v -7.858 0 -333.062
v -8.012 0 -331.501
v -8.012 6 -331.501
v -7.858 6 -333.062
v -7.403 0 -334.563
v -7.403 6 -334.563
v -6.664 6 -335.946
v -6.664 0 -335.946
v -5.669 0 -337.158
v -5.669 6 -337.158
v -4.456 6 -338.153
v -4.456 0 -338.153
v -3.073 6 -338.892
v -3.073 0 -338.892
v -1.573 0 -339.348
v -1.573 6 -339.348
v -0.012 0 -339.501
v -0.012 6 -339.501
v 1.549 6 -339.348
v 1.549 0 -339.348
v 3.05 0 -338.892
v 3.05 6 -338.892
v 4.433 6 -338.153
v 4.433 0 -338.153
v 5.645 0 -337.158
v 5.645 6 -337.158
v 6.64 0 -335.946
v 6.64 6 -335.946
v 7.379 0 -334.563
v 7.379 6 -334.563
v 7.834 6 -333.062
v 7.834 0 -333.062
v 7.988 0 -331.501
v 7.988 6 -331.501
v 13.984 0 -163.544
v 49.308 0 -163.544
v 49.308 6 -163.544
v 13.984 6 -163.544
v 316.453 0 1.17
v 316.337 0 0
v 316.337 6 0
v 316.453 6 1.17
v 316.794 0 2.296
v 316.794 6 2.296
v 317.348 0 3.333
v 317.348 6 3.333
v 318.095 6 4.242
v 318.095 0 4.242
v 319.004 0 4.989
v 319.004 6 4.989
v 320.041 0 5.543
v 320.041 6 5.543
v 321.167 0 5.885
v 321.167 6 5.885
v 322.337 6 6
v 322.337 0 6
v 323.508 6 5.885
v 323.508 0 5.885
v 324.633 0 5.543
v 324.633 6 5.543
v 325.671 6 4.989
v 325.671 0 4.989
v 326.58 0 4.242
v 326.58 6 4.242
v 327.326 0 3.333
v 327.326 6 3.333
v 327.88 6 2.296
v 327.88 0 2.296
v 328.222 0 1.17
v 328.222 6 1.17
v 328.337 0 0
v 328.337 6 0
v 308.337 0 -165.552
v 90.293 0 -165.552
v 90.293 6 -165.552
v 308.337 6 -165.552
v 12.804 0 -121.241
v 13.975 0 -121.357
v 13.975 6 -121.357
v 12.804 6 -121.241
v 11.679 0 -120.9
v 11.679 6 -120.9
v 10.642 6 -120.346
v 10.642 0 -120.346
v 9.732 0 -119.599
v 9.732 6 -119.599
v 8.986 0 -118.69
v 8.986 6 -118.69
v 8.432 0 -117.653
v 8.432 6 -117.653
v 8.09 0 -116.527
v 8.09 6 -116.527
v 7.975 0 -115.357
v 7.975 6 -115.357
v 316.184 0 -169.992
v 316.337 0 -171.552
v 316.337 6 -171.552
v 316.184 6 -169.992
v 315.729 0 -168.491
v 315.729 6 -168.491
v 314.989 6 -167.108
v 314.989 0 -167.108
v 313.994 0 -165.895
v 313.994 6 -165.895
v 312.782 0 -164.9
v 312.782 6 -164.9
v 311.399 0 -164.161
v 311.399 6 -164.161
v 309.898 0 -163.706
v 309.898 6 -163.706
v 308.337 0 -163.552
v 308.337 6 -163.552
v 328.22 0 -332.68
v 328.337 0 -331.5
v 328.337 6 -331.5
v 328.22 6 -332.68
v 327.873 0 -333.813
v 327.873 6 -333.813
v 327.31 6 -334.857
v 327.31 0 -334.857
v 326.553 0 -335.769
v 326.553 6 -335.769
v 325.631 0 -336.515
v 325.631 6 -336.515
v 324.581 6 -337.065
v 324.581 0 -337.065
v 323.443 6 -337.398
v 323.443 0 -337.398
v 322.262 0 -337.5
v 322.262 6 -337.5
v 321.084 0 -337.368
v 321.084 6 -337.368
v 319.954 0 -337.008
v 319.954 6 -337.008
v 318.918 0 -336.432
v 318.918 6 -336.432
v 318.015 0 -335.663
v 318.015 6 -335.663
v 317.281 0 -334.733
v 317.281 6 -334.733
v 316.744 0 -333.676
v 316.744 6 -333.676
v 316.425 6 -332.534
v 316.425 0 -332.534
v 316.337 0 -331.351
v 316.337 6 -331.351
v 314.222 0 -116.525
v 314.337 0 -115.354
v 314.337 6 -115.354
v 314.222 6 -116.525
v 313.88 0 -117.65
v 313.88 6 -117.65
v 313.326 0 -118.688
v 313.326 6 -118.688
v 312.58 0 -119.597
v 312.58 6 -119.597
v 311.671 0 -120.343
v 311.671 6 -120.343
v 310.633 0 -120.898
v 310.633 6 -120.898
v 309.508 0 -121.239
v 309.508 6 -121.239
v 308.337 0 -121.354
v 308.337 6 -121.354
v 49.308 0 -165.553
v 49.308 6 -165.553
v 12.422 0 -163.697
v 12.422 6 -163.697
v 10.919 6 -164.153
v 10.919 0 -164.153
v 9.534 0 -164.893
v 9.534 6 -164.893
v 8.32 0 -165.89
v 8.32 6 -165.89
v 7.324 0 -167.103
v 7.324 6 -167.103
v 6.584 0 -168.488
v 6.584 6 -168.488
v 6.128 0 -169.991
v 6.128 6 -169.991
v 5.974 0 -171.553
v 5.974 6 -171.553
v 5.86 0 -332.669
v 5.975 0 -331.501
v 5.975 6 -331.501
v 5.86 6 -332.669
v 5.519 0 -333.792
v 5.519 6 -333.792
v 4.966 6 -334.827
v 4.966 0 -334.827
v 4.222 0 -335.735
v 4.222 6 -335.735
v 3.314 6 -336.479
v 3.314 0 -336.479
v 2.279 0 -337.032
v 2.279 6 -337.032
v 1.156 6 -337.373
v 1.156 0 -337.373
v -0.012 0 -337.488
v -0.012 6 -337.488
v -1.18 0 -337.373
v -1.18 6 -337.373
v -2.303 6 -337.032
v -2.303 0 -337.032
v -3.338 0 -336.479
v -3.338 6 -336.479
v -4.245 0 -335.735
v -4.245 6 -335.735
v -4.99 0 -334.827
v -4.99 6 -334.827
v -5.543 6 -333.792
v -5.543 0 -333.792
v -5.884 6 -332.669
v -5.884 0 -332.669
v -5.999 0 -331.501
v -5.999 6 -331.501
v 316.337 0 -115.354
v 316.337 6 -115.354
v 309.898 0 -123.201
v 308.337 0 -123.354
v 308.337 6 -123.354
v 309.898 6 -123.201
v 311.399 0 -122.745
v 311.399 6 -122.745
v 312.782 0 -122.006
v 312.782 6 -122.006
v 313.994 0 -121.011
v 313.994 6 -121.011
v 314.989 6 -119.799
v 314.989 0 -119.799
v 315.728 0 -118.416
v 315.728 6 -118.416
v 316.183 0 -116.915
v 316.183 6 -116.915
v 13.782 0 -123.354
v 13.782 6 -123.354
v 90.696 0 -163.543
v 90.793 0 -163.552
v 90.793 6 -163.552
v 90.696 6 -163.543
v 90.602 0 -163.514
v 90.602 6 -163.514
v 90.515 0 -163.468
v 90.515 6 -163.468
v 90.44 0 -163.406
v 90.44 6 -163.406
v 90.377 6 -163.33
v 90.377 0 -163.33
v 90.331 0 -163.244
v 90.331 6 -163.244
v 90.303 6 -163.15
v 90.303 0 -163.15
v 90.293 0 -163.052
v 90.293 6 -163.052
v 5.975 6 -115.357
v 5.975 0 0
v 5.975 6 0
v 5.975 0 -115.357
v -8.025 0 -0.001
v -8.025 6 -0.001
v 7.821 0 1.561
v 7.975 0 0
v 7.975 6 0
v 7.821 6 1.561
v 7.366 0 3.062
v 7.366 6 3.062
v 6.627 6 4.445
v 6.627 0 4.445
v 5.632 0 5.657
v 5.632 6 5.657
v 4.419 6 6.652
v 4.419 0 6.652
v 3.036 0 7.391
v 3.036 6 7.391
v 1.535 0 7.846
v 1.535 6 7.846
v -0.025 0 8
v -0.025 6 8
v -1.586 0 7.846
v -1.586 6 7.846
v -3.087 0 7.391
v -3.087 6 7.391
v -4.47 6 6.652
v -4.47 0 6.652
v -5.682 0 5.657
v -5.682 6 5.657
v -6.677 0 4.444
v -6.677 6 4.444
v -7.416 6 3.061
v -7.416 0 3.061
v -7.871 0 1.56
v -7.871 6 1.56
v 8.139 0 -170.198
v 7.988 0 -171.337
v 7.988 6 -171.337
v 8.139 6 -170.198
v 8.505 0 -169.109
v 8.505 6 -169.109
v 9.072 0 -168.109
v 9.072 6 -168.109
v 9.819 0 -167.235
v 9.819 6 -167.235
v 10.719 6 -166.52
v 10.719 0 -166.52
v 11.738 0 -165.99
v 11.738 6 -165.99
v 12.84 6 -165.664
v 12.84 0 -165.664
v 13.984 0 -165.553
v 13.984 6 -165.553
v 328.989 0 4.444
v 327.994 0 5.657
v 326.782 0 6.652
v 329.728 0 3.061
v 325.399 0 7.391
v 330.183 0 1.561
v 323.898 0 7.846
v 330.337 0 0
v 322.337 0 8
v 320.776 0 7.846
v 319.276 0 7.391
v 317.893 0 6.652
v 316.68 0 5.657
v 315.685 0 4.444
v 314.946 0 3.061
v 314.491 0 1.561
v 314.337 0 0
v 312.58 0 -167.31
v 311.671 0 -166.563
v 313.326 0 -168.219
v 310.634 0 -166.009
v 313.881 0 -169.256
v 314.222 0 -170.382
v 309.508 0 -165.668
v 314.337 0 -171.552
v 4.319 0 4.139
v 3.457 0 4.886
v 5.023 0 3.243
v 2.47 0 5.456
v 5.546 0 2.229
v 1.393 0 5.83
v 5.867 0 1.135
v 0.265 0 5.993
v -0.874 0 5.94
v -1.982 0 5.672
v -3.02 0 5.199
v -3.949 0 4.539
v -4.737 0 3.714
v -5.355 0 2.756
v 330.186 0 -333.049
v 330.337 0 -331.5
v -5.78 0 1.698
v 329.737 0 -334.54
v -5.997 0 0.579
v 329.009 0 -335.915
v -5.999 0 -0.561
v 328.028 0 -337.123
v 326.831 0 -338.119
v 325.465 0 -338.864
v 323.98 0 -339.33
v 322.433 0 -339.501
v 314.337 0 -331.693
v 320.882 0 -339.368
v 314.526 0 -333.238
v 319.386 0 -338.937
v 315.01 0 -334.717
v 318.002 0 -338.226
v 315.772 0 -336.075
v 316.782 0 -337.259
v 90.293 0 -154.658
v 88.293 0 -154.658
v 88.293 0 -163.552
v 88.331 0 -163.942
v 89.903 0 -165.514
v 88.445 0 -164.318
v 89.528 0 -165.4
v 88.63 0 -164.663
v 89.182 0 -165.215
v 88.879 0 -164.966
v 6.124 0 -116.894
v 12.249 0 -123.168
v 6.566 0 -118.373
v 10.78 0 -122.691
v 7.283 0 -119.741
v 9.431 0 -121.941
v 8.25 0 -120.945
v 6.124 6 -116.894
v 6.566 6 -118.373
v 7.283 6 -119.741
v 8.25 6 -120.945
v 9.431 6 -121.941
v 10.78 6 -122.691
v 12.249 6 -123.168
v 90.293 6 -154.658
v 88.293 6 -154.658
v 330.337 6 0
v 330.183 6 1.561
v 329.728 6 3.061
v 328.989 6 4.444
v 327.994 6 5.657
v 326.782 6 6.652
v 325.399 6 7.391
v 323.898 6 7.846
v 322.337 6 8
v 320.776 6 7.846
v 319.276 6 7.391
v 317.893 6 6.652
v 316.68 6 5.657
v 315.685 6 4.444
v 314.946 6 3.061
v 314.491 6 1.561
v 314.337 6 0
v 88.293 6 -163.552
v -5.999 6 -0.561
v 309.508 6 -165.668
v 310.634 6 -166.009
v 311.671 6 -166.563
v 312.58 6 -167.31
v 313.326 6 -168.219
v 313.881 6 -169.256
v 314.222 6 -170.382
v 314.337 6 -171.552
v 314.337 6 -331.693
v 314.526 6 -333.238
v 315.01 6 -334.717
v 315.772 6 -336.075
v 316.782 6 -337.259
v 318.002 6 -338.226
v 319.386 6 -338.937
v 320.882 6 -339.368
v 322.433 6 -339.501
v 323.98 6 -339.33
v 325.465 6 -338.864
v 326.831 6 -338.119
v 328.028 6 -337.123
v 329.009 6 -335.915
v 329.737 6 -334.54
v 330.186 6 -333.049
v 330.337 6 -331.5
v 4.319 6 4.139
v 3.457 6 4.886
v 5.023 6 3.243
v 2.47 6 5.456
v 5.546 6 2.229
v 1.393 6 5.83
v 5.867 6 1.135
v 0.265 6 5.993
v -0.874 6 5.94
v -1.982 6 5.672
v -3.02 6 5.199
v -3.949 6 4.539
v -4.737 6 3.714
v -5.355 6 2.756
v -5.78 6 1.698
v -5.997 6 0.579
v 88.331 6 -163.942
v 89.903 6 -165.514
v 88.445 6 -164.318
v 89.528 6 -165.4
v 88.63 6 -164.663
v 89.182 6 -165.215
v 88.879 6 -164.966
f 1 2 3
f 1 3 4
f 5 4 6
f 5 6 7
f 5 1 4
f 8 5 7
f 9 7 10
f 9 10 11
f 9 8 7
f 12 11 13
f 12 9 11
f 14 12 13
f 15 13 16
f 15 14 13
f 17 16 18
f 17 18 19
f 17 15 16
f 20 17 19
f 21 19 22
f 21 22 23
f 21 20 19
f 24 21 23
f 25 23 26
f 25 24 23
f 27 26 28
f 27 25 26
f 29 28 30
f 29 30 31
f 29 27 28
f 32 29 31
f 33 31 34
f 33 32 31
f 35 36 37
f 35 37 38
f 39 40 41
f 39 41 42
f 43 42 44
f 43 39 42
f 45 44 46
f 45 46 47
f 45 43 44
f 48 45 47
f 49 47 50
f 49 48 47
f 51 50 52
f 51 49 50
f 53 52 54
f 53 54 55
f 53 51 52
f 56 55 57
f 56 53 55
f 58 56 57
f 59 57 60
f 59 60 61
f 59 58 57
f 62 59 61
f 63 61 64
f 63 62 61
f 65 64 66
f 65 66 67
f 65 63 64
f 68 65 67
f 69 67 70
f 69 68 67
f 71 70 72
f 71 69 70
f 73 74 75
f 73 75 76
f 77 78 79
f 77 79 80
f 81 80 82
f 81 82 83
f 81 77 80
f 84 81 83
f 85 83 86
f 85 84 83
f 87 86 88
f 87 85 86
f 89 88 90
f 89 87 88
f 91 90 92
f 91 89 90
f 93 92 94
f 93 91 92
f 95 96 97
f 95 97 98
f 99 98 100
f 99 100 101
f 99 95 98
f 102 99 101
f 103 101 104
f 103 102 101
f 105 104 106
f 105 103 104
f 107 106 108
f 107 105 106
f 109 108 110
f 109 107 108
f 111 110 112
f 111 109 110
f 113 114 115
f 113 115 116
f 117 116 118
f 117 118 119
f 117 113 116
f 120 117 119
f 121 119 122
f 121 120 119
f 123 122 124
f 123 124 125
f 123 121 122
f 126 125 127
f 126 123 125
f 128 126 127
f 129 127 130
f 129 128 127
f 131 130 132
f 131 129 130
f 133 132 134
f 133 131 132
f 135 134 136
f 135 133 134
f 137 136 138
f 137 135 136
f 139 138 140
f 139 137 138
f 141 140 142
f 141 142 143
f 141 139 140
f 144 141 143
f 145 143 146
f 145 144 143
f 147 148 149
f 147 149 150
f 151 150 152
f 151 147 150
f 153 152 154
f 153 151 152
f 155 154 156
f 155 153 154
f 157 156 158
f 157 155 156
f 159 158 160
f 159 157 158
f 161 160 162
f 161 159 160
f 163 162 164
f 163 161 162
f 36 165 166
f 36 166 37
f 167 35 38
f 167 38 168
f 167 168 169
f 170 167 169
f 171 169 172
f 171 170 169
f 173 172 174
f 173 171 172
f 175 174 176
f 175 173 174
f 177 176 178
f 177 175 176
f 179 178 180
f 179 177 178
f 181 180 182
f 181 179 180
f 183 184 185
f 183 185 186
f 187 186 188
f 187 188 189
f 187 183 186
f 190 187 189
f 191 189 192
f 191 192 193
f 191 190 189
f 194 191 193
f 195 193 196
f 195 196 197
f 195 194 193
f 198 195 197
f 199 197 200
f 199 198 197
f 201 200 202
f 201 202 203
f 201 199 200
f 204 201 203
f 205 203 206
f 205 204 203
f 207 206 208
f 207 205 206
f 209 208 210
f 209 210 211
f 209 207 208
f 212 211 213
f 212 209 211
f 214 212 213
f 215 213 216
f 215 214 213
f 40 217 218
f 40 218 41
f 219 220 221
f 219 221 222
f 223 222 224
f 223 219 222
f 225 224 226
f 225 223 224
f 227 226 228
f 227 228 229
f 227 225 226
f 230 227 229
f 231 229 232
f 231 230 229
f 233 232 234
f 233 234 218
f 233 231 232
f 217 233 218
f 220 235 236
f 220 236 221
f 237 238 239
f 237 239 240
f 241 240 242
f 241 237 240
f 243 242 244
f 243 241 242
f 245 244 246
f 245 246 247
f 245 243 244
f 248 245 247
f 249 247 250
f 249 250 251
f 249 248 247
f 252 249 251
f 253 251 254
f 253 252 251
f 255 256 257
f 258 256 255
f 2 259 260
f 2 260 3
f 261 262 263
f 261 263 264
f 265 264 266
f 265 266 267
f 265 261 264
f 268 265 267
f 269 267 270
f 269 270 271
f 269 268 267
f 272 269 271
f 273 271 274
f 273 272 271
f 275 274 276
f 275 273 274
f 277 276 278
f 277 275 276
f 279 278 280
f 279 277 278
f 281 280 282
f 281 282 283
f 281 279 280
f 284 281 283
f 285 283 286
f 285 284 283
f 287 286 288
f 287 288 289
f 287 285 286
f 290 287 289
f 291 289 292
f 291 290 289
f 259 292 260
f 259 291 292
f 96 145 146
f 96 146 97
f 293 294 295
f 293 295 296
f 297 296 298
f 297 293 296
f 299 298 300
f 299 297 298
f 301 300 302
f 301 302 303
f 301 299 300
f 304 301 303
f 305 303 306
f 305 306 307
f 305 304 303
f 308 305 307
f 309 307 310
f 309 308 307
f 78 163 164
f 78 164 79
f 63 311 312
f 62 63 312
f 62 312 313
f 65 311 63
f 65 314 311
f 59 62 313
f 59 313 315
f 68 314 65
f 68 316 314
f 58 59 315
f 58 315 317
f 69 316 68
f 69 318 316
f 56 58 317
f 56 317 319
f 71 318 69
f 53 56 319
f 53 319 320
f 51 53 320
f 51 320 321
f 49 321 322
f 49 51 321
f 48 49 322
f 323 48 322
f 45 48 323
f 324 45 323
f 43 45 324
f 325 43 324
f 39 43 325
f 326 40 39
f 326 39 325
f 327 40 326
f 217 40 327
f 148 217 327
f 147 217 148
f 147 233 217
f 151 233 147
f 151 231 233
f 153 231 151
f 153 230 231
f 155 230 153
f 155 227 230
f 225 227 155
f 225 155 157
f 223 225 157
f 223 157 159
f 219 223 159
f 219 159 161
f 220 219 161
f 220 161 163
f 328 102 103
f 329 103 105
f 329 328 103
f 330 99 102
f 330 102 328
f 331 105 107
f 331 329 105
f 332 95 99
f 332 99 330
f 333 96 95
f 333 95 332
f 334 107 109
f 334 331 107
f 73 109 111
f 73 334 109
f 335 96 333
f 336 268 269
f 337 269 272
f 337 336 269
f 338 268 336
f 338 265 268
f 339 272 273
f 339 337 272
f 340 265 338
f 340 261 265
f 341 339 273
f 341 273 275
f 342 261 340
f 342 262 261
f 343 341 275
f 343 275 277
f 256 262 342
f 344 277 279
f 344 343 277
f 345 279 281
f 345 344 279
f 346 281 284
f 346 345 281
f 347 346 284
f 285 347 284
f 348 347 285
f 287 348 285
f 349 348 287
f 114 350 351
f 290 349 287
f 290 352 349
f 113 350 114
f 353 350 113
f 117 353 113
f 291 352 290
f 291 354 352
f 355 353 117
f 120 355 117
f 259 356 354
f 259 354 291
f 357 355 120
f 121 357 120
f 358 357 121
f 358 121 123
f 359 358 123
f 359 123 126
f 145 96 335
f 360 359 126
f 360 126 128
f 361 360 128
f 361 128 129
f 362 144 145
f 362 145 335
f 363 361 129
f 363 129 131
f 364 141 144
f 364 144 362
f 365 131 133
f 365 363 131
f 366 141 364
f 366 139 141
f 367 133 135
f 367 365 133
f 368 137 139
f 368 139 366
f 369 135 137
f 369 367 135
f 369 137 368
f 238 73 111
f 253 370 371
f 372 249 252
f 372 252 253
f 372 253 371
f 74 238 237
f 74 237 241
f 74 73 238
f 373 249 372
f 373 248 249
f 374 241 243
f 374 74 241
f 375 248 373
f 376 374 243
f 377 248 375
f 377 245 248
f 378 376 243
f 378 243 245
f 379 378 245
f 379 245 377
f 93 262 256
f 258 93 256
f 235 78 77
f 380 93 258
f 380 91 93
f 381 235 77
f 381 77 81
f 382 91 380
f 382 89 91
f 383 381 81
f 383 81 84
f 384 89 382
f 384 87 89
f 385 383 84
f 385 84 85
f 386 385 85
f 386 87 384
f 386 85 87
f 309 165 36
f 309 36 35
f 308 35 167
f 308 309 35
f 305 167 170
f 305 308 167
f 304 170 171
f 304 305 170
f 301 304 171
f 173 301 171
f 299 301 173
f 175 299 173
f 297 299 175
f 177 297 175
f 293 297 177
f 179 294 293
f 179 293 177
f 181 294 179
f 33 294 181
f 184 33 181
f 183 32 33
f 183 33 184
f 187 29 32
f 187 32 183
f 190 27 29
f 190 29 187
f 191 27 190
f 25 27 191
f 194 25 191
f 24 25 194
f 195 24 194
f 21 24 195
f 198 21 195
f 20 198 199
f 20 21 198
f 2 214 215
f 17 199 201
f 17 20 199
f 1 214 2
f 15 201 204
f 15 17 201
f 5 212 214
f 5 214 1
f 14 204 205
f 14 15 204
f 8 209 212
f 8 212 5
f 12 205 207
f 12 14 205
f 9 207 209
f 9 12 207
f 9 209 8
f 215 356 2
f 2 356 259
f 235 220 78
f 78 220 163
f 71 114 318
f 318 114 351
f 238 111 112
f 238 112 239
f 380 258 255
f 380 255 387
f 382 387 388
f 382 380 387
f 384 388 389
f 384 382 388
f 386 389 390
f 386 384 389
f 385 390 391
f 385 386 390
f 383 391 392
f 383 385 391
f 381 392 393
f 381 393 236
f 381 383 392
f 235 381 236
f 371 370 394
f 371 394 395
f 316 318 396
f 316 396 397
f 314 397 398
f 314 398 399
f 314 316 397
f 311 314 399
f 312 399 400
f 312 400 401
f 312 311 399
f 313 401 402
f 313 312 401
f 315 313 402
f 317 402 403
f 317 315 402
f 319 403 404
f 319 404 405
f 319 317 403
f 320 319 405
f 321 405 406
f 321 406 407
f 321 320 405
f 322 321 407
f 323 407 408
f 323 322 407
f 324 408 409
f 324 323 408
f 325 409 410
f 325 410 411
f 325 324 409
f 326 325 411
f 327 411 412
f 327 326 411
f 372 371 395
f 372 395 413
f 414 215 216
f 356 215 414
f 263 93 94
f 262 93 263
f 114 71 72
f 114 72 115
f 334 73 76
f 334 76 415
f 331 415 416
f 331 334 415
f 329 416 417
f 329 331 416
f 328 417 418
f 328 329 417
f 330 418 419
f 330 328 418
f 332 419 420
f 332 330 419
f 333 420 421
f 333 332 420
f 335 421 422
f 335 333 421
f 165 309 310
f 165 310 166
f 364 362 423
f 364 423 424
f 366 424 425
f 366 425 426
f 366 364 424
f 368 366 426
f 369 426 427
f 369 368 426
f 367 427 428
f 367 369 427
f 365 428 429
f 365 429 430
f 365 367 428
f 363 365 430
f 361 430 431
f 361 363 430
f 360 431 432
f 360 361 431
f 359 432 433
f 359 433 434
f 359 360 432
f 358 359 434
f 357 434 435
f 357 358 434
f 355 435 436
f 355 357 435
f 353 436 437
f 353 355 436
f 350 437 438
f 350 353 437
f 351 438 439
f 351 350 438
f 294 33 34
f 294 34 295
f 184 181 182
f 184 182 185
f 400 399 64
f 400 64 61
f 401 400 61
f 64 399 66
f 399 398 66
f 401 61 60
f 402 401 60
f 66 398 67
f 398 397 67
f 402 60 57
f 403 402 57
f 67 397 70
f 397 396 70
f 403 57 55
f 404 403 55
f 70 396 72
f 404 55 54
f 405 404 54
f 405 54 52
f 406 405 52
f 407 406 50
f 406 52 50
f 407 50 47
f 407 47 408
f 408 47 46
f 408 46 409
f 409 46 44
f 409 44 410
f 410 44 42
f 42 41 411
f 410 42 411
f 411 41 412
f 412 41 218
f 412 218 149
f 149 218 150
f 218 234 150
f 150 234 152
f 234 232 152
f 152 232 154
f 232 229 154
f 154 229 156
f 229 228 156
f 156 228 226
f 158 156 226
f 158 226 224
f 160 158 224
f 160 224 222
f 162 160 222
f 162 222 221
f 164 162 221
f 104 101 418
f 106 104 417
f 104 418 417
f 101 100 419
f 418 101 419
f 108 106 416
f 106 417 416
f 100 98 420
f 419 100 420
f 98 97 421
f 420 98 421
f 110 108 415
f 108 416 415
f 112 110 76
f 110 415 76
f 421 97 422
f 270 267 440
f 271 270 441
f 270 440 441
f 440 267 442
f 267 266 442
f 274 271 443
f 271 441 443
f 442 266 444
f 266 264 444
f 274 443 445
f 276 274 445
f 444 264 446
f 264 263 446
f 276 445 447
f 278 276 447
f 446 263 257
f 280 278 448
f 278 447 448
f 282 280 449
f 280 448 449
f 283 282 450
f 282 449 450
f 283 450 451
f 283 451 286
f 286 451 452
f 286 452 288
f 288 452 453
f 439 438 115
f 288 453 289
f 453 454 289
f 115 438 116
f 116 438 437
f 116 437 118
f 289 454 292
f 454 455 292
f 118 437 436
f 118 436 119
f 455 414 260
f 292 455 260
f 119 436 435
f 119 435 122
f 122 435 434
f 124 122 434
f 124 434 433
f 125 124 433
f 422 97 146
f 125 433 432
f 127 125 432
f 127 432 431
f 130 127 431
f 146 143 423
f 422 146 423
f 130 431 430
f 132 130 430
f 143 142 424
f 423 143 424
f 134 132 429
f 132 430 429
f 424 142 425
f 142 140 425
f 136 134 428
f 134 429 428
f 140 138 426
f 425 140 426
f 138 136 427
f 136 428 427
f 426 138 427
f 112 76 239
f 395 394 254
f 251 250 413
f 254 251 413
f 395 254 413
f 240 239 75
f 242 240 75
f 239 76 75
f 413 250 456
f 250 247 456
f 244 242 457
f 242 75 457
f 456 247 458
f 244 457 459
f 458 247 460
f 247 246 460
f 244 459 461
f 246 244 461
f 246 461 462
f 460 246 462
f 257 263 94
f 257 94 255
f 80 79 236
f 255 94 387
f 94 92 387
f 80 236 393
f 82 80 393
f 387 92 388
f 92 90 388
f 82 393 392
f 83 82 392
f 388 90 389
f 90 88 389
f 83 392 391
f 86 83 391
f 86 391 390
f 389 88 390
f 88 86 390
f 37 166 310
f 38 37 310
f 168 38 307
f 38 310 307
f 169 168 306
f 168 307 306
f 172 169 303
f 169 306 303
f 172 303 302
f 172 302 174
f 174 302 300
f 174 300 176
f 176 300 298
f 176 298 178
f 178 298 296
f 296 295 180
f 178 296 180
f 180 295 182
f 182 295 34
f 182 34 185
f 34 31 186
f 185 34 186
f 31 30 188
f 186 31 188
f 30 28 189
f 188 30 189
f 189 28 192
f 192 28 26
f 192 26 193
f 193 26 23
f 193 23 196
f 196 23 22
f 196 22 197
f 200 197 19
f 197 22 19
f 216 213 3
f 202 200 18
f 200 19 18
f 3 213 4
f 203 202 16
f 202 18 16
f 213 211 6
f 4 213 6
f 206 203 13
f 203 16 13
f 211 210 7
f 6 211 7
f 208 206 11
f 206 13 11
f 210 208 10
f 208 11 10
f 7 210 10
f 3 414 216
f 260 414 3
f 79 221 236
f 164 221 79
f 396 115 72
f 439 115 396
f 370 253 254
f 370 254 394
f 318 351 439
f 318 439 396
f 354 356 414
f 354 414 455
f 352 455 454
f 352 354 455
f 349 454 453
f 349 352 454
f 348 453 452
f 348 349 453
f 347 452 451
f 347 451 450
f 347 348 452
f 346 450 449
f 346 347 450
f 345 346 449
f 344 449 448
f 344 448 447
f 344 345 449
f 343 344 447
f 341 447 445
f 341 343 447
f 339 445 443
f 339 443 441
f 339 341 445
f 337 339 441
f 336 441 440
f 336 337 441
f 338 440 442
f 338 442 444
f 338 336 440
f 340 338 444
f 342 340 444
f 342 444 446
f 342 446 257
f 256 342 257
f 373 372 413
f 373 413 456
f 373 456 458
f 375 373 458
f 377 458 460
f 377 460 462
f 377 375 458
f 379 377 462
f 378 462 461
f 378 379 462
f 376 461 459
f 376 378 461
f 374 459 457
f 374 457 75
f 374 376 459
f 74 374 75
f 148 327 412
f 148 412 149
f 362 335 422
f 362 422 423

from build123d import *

# Parameters (mm, degrees)
BOSS_EXTRUDE2_DEPTH = 6


with BuildPart() as part:
    # Sketch1 → Boss-Extrude2 (new body)
    with BuildSketch(Plane(origin=(0, 0, 0), x_dir=(1, 0, 0), z_dir=(0, 1, 0))):
        with BuildLine():
            Line((7.988162854, 331.501326389), (7.988162854, 171.337454215))
            ThreePointArc((7.988162854, 171.337454215), (9.818693497, 167.235107296), (13.984274361, 165.553432905))
            Line((13.984274361, 165.553432905), (49.307855037, 165.553432905))
            Line((49.307855037, 165.553432905), (49.307855037, 163.543518894))
            Line((49.307855037, 163.543518894), (13.984274361, 163.543518894))
            ThreePointArc((13.984274361, 163.543518894), (8.320398521, 165.889579716), (5.974360349, 171.553464938))
            Line((5.974360349, 171.553464938), (5.974999998, 331.501302447))
            ThreePointArc((5.974999998, 331.501302447), (-0.011825567, 337.488163533), (-5.998674291, 331.501325605))
            Line((-5.998674291, 331.501325605), (-5.998674291, 0.561440532))
            ThreePointArc((-5.998674291, 0.561440532), (-0.306028697, -5.993414959), (5.975, 0))
            Line((5.975, 0), (5.975, 115.356719051))
            ThreePointArc((5.975, 115.356719051), (8.250227281, 120.944829403), (13.781744328, 123.354384475))
            Line((13.781744328, 123.354384475), (308.33721248, 123.354384475))
            ThreePointArc((308.33721248, 123.354384475), (313.994066729, 121.011238725), (316.33721248, 115.354384475))
            Line((316.33721248, 115.354384475), (316.33721248, 0.000205216))
            ThreePointArc((316.33721248, 0.000205216), (322.337222061, -5.999794784), (328.33721248, 0.000224379))
            Line((328.33721248, 0.000224379), (328.336683355, 331.50001256))
            ThreePointArc((328.336683355, 331.50001256), (322.26179375, 337.500094056), (316.337490676, 331.351281588))
            Line((316.337490676, 331.351281588), (316.337490676, 171.552255024))
            ThreePointArc((316.337490676, 171.552255024), (313.994332551, 165.895370899), (308.337448427, 163.552212774))
            Line((308.337448427, 163.552212774), (90.793200611, 163.552212774))
            ThreePointArc((90.793200611, 163.552212774), (90.43964722, 163.405766165), (90.293200611, 163.052212774))
            Line((90.293200611, 163.052212774), (90.293200611, 157.424591987))
            Line((90.293200611, 157.424591987), (90.293200611, 154.657877928))
            Line((90.293200611, 154.657877928), (88.293002078, 154.657877928))
            Line((88.293002078, 154.657877928), (88.293002078, 157.424591987))
            Line((88.293002078, 157.424591987), (88.293002078, 163.552212774))
            ThreePointArc((88.293002078, 163.552212774), (88.878788516, 164.966468586), (90.293002078, 165.552255024))
            Line((90.293002078, 165.552255024), (308.337448427, 165.552255024))
            ThreePointArc((308.337448427, 165.552255024), (312.580089114, 167.309614337), (314.337448427, 171.552255024))
            Line((314.337448427, 171.552255024), (314.337448427, 331.693156944))
            ThreePointArc((314.337448427, 331.693156944), (322.432732181, 339.500501309), (330.33721248, 331.500036554))
            Line((330.33721248, 331.500036554), (330.33721248, 0.000205216))
            ThreePointArc((330.33721248, 0.000205216), (322.33721248, -7.999794784), (314.33721248, 0.000205216))
            Line((314.33721248, 0.000205216), (314.33721248, 115.354384475))
            ThreePointArc((314.33721248, 115.354384475), (312.579853167, 119.597025163), (308.33721248, 121.354384475))
            Line((308.33721248, 121.354384475), (13.975047586, 121.356719051))
            ThreePointArc((13.975047586, 121.356719051), (9.732376137, 119.599376562), (7.975, 115.356719051))
            Line((7.975, 115.356719051), (7.975, 0))
            ThreePointArc((7.975, 0), (-0.025317655, -7.999999994), (-8.024999975, 0.000635309))
            Line((-8.024999975, 0.000635309), (-8.011837146, 331.501326389))
            ThreePointArc((-8.011837146, 331.501326389), (-0.011837146, 339.501326389), (7.988162854, 331.501326389))
        make_face()
    extrude(amount=BOSS_EXTRUDE2_DEPTH)


solid = part.part
